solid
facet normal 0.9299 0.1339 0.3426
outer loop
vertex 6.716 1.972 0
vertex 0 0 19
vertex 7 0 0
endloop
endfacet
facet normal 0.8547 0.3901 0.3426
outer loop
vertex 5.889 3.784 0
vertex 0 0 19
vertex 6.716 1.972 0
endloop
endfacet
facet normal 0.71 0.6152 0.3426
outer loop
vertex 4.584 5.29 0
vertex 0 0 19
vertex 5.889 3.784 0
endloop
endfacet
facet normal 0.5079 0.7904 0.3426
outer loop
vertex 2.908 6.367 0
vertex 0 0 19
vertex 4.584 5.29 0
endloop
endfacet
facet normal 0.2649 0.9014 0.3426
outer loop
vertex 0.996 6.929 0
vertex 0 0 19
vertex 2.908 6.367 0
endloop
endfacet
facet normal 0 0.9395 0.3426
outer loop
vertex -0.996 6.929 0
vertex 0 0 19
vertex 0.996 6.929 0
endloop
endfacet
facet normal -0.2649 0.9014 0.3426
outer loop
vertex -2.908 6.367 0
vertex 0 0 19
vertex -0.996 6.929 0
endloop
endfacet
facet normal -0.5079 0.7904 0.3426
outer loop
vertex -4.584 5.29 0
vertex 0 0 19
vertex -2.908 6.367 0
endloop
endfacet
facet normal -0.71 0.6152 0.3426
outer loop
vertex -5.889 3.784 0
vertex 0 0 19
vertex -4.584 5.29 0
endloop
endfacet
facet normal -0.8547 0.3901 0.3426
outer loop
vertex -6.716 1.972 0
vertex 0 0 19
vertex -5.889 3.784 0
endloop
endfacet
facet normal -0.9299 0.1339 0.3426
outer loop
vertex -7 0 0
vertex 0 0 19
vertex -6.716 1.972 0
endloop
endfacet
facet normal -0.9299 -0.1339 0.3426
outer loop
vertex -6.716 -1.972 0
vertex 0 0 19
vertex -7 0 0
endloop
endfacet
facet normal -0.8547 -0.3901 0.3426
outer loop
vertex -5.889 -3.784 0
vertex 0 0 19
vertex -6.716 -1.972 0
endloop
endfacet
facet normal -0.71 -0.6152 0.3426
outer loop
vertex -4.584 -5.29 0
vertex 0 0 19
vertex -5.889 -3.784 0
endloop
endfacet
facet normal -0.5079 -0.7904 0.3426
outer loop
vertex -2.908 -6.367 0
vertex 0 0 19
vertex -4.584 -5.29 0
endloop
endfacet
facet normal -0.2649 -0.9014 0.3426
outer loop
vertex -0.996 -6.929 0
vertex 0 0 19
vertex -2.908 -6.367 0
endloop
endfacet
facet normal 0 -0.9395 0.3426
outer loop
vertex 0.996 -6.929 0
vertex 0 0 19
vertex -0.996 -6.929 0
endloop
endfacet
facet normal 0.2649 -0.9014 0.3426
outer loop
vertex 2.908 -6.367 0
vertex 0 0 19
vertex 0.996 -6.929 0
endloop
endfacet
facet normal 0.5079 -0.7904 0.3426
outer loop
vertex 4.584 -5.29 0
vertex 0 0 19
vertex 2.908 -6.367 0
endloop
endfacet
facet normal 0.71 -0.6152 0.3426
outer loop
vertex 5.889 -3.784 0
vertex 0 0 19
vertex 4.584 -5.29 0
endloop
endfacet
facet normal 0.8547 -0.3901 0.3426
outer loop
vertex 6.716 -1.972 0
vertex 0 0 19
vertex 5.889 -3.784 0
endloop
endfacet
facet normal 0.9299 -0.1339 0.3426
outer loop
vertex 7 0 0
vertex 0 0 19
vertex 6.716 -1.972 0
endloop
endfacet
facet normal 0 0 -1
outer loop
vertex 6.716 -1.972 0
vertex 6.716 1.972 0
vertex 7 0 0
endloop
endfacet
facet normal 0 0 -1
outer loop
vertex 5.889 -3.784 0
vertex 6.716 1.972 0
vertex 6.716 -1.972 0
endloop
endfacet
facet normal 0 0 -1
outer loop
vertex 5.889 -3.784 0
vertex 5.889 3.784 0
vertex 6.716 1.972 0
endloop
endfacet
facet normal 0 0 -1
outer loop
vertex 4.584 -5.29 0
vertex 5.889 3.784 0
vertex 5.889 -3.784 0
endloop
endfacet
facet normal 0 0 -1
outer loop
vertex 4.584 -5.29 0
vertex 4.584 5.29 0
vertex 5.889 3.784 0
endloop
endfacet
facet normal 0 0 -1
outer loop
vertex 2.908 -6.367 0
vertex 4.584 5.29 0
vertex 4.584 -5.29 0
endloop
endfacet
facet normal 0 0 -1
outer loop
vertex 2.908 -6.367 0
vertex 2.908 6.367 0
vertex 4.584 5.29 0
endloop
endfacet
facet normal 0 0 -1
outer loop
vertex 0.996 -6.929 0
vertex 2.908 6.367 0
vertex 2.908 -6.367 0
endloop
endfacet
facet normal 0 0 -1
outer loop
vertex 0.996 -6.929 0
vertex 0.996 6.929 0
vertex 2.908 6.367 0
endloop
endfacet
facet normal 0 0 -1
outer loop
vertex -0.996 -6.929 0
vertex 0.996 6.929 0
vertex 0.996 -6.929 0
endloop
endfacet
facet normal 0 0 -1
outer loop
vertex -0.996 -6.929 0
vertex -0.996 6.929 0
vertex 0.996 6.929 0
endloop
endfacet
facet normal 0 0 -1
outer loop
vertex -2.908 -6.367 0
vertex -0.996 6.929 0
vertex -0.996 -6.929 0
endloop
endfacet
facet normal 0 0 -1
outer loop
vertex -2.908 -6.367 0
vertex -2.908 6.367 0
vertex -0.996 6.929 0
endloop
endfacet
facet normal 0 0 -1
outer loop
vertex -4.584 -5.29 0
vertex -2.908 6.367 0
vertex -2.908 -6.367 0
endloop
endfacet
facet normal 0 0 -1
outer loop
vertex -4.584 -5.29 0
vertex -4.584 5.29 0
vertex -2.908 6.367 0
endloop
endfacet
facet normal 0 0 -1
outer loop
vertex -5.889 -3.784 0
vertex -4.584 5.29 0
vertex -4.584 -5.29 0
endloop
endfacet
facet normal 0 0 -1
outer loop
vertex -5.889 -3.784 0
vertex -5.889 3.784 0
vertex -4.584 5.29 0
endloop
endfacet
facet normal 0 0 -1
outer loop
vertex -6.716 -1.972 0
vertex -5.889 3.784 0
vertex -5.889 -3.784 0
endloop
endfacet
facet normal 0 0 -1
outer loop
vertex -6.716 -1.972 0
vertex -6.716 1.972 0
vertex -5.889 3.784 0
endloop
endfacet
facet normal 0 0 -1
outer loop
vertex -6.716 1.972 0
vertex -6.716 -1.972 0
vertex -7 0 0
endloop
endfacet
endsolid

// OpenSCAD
// Generated by SolidPython 1.0.1 on 2020-07-29 00:46:43


cylinder(h = 19, r1 = 7, r2 = 0);
/***********************************************
*********      SolidPython code:      **********
************************************************
 
# import packages: SolidPython
from solid import *
from solid.utils import *
from itertools import chain, combinations, permutations


class Resize:

    def __init__(self, scad_file):
        self.scad_file = scad_file
        #self.scad_file = import_scad(scad_file)
        # cone/cylinder param:
        self.r1 = 0
        self.r2 = 0
        self.h = 0
        # rectangular prism param:
        self.w = 0
        self.l = 0
        # ellipse param:
        self.r = 0

    # import OpenScad code (file name corresponds to shape)


    # classify shape + parameters
    def assign(self, param1, param2, param3):
        if self.scad_file == 'cone.scad':
            self.r1 = param1
            self.r2 = param2
            self.h = param3
        elif self.scad_file == 'cylinder.scad':
            self.r1 = param1
            self.r2 = param2
            self.h = param3
        elif self.scad_file == 'rectangularPrism.scad':
            self.h = param1
            self.l = param2
            self.w = param3
        else:
            self.r = param1
            self.h = param2

    # resize parameters
    def iterate(self):
        x = range(3, 20, 2)
        i = 1
        if self.scad_file == 'cone.scad':
            tempList = list(permutations(x, 2))
            for temp in tempList:
                param1 = temp[0]
                param2 = temp[1]
                filepath = 'produced_scad_files/' + 'cone' + str(param1) + '_' + str(param2) + '_' + '.scad'
                scad_render_to_file(cylinder(h=param1, r1=param2, r2=0), filepath)

        elif self.scad_file == 'cylinder.scad':
            tempList = list(permutations(x, 3))
            for temp in tempList:
                param1 = temp[0]
                param2 = temp[1]
                filepath = 'produced_scad_files/' + 'cylinder' + str(param1) + '_' + str(param2) + '_' + '.scad'
                scad_render_to_file(cylinder(h=param1, r1=param2, r2=param2), filepath)

        elif self.scad_file == 'rectangularPrism.scad':
            tempList = list(permutations(x, 3))
            for temp in tempList:
                param1 = temp[0]
                param2 = temp[1]
                param3 = temp[2]
                filepath = 'produced_scad_files/' + 'rectangularPrism' + str(param1) + '_' + str(param2) + '_' + str(
                    param3) + '.scad'
                scad_render_to_file(cube(size=(param1, param2, param3)), filepath)

        elif self.scad_file == 'ellipse.scad':
            tempList = list(permutations(x, 4))
            for temp in tempList:
                param1 = temp[0]
                param2 = temp[1]
                param3 = temp[2]
                param4 = temp[3]
                filepath = 'produced_scad_files/' + 'ellipse' + str(param1) + '_' + str(param2) + '_' + str(param3) + '_' + str(param4) + '.scad'
                scad_render_to_file(scale([param1, param2, param3])(sphere(r=param4)), filepath)

    def render_to_scadfile(self):
        scad_render_to_file(scad, 'example.scad') 
 
************************************************/
